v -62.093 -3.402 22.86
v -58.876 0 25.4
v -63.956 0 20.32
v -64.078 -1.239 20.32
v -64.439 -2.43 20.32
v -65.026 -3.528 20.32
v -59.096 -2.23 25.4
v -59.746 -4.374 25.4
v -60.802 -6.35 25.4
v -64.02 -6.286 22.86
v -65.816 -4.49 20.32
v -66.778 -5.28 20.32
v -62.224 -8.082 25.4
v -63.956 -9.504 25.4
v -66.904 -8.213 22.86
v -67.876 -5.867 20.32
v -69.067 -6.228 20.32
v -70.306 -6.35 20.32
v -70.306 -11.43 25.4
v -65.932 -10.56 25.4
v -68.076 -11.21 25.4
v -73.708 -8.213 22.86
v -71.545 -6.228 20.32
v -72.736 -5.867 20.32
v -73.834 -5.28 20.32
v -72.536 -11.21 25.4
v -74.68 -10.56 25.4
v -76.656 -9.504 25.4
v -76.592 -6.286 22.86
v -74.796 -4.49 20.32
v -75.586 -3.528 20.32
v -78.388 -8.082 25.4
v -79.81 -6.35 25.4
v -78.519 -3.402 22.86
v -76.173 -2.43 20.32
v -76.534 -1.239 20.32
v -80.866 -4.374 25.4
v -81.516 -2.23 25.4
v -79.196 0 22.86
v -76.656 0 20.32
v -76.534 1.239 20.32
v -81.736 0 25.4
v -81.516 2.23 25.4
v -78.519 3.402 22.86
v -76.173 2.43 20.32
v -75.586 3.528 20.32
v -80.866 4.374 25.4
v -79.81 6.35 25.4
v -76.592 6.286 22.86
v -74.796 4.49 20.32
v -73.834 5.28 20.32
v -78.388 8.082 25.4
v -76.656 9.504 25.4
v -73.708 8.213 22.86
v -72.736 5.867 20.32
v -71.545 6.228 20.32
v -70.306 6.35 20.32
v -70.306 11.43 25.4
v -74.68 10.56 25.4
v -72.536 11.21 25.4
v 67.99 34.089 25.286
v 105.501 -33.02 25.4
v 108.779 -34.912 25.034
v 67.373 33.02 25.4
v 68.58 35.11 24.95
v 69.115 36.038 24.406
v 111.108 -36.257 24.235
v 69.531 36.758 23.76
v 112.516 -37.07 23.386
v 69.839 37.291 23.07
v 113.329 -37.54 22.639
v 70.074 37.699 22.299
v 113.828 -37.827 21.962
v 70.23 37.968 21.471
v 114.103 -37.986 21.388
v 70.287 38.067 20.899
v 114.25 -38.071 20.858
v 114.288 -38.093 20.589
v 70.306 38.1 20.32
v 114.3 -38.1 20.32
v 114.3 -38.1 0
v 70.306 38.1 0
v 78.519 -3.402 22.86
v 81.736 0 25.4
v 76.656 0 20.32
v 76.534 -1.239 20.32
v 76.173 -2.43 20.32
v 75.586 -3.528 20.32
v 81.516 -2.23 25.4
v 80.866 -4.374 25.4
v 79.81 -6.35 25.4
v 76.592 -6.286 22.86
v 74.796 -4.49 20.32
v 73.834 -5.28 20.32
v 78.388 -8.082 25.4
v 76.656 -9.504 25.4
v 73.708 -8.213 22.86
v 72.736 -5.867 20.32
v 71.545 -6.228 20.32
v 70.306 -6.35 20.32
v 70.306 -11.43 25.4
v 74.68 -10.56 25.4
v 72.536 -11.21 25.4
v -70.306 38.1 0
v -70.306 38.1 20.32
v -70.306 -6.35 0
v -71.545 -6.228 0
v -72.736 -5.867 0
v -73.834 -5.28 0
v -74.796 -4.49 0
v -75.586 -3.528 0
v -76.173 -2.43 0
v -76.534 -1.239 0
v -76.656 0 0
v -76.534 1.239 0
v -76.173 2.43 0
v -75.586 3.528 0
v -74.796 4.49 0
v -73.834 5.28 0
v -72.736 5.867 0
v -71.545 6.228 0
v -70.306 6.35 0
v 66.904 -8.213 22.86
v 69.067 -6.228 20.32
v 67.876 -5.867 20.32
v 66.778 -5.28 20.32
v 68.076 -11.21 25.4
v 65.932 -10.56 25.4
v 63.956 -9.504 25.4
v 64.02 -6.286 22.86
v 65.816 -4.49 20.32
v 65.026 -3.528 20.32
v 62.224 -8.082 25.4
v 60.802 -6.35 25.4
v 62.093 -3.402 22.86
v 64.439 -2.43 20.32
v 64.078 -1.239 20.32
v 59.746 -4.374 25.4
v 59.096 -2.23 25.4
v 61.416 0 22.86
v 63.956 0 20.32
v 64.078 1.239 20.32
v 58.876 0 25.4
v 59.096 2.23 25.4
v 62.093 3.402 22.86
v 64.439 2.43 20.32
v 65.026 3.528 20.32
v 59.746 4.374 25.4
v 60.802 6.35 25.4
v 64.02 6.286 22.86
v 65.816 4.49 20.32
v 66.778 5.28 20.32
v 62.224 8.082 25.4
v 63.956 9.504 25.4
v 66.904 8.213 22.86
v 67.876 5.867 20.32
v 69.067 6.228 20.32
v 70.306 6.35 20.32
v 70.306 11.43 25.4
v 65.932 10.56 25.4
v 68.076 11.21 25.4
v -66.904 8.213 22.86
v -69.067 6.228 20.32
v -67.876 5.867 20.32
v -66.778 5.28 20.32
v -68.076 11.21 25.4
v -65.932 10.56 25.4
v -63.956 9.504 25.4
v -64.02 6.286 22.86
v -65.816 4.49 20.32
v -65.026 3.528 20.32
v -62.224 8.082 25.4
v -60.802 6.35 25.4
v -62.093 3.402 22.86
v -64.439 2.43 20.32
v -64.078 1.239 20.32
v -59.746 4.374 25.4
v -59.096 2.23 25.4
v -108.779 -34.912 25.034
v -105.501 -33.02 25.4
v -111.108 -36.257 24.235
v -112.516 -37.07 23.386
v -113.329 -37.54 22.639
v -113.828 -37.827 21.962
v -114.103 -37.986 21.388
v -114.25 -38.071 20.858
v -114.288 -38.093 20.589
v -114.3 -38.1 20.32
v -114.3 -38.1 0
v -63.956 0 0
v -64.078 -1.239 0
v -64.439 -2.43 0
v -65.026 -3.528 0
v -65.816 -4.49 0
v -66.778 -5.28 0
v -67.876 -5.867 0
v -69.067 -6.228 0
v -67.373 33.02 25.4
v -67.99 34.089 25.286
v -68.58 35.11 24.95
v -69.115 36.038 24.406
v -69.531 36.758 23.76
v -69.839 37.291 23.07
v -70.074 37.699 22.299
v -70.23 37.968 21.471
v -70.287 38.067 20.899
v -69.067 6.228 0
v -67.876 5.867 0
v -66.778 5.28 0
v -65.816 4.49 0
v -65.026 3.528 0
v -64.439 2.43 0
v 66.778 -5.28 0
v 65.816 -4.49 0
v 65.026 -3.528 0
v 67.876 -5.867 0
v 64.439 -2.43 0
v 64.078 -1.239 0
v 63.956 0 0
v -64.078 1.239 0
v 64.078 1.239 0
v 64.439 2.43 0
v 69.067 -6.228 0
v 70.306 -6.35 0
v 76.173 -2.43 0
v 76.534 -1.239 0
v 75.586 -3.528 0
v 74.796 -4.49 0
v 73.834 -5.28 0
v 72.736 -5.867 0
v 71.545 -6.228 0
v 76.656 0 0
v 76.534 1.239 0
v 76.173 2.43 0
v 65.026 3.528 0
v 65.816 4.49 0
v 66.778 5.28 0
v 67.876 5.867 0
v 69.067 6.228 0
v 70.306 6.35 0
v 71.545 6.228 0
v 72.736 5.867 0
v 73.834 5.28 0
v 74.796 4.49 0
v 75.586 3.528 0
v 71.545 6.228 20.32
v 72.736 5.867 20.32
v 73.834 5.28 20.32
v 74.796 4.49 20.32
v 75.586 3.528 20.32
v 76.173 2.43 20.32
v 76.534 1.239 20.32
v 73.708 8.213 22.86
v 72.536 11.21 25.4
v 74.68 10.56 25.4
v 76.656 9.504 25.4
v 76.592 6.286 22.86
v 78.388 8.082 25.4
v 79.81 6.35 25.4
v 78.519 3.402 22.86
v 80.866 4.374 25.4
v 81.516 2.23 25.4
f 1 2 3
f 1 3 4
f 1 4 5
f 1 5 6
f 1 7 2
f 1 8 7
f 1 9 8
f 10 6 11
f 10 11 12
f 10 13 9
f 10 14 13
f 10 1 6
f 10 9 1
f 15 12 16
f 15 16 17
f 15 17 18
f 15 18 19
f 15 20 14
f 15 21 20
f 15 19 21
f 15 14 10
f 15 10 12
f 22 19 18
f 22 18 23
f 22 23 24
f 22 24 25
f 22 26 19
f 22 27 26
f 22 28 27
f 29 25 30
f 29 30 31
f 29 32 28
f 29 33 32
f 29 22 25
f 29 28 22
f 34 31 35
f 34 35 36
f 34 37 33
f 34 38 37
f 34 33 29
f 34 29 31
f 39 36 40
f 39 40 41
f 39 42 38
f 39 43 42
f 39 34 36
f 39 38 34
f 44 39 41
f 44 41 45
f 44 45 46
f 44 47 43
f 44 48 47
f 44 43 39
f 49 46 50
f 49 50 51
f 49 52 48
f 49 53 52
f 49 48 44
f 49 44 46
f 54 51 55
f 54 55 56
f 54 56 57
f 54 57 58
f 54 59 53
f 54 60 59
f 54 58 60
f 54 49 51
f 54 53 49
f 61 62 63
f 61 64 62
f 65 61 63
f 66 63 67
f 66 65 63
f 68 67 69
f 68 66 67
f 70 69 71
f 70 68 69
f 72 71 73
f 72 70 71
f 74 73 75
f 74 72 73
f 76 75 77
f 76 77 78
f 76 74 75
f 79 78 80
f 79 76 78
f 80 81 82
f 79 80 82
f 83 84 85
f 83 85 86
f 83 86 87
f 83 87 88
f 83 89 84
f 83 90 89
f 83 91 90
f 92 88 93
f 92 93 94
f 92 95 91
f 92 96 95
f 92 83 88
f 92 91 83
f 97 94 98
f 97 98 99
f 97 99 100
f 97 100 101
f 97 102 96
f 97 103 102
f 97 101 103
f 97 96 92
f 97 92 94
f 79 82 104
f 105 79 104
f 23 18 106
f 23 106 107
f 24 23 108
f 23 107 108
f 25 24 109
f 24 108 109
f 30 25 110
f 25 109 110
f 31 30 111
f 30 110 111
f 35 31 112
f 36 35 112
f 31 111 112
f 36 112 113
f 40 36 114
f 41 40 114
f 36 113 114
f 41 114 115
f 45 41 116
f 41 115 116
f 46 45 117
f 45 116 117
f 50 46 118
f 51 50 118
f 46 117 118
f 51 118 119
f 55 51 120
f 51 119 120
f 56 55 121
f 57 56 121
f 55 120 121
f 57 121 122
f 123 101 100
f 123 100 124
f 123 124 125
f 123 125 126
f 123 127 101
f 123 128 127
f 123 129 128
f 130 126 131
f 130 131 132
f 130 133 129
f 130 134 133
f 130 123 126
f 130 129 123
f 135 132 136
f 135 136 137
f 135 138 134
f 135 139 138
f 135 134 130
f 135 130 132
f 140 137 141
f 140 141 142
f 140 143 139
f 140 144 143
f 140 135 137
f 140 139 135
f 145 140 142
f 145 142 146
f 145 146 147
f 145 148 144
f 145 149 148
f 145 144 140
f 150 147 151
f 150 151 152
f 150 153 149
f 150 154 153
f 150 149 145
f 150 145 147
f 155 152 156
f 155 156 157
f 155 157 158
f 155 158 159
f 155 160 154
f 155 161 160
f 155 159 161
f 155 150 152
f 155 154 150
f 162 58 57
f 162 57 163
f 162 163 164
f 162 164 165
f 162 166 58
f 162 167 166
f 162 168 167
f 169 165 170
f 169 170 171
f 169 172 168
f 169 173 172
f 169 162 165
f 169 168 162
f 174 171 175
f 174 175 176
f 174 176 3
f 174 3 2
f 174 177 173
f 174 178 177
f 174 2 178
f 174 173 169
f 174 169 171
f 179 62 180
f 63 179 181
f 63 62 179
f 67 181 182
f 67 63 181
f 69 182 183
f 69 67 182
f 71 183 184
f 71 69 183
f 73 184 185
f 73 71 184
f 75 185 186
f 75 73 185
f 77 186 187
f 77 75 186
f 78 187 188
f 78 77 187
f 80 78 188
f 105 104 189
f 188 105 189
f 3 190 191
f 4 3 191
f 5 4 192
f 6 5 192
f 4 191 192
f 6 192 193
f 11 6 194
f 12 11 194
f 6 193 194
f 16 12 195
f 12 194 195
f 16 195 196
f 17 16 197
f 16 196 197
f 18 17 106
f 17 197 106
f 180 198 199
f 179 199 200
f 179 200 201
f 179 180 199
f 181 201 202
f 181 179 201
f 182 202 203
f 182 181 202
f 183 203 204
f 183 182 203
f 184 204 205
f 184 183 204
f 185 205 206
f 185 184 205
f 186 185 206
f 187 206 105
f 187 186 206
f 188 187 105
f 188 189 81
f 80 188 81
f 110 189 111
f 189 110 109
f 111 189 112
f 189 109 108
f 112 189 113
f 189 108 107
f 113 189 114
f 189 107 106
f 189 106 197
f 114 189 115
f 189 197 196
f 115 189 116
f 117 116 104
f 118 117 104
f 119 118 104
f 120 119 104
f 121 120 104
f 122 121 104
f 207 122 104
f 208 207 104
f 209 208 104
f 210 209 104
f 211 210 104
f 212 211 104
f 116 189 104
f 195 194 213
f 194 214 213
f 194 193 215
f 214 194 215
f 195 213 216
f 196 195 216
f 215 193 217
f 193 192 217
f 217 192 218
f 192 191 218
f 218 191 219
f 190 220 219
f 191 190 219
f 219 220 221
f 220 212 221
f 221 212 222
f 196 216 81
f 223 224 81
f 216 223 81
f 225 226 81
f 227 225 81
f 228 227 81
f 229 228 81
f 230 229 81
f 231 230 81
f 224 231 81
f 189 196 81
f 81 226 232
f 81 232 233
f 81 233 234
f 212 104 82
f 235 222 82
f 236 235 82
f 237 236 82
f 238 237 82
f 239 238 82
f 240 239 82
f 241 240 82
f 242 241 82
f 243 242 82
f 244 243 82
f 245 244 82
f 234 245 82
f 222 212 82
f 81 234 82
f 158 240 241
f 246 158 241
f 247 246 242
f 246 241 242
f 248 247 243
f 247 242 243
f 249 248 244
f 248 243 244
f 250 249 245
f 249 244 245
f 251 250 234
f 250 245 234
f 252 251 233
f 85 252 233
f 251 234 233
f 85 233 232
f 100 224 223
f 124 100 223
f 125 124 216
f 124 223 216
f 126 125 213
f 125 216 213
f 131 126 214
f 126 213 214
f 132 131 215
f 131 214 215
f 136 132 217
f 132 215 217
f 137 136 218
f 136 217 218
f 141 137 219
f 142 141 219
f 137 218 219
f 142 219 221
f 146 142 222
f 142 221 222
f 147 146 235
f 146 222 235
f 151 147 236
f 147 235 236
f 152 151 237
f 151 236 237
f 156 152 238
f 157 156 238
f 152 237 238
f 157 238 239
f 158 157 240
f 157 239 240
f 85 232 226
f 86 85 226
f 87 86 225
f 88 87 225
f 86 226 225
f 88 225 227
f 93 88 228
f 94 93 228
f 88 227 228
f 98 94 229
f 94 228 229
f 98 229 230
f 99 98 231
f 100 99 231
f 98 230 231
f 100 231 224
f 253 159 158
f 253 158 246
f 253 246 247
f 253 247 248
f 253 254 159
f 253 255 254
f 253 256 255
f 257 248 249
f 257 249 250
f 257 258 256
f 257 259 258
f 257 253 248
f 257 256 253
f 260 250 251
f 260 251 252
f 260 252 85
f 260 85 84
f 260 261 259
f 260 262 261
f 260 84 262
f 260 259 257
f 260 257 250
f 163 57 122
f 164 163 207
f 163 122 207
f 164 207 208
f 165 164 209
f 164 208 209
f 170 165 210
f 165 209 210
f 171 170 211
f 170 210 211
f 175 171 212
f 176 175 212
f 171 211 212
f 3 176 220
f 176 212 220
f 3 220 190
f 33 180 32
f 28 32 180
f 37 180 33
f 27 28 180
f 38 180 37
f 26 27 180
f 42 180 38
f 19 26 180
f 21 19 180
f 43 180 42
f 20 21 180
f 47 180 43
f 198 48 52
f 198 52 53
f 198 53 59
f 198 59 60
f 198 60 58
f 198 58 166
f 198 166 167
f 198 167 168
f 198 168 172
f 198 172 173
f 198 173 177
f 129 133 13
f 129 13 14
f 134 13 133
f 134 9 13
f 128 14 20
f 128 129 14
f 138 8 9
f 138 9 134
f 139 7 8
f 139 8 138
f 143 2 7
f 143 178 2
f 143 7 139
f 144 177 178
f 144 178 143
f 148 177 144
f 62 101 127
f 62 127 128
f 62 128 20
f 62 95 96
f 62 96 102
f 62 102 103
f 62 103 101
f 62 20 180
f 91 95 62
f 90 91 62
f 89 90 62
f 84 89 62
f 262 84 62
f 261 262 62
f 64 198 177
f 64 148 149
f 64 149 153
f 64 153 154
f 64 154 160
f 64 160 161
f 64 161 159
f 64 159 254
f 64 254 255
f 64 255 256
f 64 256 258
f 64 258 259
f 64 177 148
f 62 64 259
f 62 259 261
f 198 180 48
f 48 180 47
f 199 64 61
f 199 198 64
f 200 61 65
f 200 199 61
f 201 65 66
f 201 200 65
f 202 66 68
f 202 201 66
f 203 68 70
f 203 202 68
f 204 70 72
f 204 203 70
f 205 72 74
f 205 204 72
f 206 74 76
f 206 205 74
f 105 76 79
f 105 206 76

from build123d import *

# Parameters (mm, degrees)
F1_DEPTH = 25.4
F2_SIZE  = 5.08
F3_R     = 5.08


with BuildPart() as f1:
    # F0 (on Top) → F1 (new body)
    with BuildSketch(Plane.XY):
        with BuildLine():
            Line((-70.3059094878, 6.35), (-70.3059094878, 38.1))
            Line((-70.3059094878, 38.1), (-114.3, -38.1))
            Line((-114.3, -38.1), (-70.3059094878, -38.1))
            Line((-70.3059094878, -38.1), (-70.3059094878, -6.35))
            ThreePointArc((-70.3059094878, -6.35), (-76.6559094878, 0), (-70.3059094878, 6.35))
        make_face()
        with BuildLine():
            Line((70.3059094878, 6.35), (70.3059094878, 38.1))
            Line((70.3059094878, 38.1), (-70.3059094878, 38.1))
            Line((-70.3059094878, 38.1), (-70.3059094878, 6.35))
            ThreePointArc((-70.3059094878, 6.35), (-65.8157814272, 4.4901280605), (-63.9559094878, 0))
            ThreePointArc((-63.9559094878, 0), (-65.8157814272, -4.4901280605), (-70.3059094878, -6.35))
            Line((-70.3059094878, -6.35), (-70.3059094878, -38.1))
            Line((-70.3059094878, -38.1), (70.3059094878, -38.1))
            Line((70.3059094878, -38.1), (70.3059094878, -6.35))
            ThreePointArc((70.3059094878, -6.35), (63.9559094878, 0), (70.3059094878, 6.35))
        make_face()
        with BuildLine():
            Line((114.3, -38.1), (70.3059094878, 38.1))
            Line((70.3059094878, 38.1), (70.3059094878, 6.35))
            ThreePointArc((70.3059094878, 6.35), (74.7960375483, 4.4901280605), (76.6559094878, 0))
            ThreePointArc((76.6559094878, 0), (74.7960375483, -4.4901280605), (70.3059094878, -6.35))
            Line((70.3059094878, -6.35), (70.3059094878, -38.1))
            Line((70.3059094878, -38.1), (114.3, -38.1))
        make_face()
    extrude(amount=F1_DEPTH)

    # F2
    f2_edges = [f1.edges().sort_by_distance(p)[0] for p in [
        (-70.305909, -6.35, 25.4),
        (70.305909, -6.35, 25.4),
    ]]
    chamfer(f2_edges, length=F2_SIZE)

    # F3
    f3_edges = [f1.edges().sort_by_distance(p)[0] for p in [
        (0, -38.1, 25.4),
        (-92.302955, 0, 25.4),
        (0, 38.1, 25.4),
        (92.302955, 0, 25.4),
    ]]
    fillet(f3_edges, radius=F3_R)


solid = f1.part
